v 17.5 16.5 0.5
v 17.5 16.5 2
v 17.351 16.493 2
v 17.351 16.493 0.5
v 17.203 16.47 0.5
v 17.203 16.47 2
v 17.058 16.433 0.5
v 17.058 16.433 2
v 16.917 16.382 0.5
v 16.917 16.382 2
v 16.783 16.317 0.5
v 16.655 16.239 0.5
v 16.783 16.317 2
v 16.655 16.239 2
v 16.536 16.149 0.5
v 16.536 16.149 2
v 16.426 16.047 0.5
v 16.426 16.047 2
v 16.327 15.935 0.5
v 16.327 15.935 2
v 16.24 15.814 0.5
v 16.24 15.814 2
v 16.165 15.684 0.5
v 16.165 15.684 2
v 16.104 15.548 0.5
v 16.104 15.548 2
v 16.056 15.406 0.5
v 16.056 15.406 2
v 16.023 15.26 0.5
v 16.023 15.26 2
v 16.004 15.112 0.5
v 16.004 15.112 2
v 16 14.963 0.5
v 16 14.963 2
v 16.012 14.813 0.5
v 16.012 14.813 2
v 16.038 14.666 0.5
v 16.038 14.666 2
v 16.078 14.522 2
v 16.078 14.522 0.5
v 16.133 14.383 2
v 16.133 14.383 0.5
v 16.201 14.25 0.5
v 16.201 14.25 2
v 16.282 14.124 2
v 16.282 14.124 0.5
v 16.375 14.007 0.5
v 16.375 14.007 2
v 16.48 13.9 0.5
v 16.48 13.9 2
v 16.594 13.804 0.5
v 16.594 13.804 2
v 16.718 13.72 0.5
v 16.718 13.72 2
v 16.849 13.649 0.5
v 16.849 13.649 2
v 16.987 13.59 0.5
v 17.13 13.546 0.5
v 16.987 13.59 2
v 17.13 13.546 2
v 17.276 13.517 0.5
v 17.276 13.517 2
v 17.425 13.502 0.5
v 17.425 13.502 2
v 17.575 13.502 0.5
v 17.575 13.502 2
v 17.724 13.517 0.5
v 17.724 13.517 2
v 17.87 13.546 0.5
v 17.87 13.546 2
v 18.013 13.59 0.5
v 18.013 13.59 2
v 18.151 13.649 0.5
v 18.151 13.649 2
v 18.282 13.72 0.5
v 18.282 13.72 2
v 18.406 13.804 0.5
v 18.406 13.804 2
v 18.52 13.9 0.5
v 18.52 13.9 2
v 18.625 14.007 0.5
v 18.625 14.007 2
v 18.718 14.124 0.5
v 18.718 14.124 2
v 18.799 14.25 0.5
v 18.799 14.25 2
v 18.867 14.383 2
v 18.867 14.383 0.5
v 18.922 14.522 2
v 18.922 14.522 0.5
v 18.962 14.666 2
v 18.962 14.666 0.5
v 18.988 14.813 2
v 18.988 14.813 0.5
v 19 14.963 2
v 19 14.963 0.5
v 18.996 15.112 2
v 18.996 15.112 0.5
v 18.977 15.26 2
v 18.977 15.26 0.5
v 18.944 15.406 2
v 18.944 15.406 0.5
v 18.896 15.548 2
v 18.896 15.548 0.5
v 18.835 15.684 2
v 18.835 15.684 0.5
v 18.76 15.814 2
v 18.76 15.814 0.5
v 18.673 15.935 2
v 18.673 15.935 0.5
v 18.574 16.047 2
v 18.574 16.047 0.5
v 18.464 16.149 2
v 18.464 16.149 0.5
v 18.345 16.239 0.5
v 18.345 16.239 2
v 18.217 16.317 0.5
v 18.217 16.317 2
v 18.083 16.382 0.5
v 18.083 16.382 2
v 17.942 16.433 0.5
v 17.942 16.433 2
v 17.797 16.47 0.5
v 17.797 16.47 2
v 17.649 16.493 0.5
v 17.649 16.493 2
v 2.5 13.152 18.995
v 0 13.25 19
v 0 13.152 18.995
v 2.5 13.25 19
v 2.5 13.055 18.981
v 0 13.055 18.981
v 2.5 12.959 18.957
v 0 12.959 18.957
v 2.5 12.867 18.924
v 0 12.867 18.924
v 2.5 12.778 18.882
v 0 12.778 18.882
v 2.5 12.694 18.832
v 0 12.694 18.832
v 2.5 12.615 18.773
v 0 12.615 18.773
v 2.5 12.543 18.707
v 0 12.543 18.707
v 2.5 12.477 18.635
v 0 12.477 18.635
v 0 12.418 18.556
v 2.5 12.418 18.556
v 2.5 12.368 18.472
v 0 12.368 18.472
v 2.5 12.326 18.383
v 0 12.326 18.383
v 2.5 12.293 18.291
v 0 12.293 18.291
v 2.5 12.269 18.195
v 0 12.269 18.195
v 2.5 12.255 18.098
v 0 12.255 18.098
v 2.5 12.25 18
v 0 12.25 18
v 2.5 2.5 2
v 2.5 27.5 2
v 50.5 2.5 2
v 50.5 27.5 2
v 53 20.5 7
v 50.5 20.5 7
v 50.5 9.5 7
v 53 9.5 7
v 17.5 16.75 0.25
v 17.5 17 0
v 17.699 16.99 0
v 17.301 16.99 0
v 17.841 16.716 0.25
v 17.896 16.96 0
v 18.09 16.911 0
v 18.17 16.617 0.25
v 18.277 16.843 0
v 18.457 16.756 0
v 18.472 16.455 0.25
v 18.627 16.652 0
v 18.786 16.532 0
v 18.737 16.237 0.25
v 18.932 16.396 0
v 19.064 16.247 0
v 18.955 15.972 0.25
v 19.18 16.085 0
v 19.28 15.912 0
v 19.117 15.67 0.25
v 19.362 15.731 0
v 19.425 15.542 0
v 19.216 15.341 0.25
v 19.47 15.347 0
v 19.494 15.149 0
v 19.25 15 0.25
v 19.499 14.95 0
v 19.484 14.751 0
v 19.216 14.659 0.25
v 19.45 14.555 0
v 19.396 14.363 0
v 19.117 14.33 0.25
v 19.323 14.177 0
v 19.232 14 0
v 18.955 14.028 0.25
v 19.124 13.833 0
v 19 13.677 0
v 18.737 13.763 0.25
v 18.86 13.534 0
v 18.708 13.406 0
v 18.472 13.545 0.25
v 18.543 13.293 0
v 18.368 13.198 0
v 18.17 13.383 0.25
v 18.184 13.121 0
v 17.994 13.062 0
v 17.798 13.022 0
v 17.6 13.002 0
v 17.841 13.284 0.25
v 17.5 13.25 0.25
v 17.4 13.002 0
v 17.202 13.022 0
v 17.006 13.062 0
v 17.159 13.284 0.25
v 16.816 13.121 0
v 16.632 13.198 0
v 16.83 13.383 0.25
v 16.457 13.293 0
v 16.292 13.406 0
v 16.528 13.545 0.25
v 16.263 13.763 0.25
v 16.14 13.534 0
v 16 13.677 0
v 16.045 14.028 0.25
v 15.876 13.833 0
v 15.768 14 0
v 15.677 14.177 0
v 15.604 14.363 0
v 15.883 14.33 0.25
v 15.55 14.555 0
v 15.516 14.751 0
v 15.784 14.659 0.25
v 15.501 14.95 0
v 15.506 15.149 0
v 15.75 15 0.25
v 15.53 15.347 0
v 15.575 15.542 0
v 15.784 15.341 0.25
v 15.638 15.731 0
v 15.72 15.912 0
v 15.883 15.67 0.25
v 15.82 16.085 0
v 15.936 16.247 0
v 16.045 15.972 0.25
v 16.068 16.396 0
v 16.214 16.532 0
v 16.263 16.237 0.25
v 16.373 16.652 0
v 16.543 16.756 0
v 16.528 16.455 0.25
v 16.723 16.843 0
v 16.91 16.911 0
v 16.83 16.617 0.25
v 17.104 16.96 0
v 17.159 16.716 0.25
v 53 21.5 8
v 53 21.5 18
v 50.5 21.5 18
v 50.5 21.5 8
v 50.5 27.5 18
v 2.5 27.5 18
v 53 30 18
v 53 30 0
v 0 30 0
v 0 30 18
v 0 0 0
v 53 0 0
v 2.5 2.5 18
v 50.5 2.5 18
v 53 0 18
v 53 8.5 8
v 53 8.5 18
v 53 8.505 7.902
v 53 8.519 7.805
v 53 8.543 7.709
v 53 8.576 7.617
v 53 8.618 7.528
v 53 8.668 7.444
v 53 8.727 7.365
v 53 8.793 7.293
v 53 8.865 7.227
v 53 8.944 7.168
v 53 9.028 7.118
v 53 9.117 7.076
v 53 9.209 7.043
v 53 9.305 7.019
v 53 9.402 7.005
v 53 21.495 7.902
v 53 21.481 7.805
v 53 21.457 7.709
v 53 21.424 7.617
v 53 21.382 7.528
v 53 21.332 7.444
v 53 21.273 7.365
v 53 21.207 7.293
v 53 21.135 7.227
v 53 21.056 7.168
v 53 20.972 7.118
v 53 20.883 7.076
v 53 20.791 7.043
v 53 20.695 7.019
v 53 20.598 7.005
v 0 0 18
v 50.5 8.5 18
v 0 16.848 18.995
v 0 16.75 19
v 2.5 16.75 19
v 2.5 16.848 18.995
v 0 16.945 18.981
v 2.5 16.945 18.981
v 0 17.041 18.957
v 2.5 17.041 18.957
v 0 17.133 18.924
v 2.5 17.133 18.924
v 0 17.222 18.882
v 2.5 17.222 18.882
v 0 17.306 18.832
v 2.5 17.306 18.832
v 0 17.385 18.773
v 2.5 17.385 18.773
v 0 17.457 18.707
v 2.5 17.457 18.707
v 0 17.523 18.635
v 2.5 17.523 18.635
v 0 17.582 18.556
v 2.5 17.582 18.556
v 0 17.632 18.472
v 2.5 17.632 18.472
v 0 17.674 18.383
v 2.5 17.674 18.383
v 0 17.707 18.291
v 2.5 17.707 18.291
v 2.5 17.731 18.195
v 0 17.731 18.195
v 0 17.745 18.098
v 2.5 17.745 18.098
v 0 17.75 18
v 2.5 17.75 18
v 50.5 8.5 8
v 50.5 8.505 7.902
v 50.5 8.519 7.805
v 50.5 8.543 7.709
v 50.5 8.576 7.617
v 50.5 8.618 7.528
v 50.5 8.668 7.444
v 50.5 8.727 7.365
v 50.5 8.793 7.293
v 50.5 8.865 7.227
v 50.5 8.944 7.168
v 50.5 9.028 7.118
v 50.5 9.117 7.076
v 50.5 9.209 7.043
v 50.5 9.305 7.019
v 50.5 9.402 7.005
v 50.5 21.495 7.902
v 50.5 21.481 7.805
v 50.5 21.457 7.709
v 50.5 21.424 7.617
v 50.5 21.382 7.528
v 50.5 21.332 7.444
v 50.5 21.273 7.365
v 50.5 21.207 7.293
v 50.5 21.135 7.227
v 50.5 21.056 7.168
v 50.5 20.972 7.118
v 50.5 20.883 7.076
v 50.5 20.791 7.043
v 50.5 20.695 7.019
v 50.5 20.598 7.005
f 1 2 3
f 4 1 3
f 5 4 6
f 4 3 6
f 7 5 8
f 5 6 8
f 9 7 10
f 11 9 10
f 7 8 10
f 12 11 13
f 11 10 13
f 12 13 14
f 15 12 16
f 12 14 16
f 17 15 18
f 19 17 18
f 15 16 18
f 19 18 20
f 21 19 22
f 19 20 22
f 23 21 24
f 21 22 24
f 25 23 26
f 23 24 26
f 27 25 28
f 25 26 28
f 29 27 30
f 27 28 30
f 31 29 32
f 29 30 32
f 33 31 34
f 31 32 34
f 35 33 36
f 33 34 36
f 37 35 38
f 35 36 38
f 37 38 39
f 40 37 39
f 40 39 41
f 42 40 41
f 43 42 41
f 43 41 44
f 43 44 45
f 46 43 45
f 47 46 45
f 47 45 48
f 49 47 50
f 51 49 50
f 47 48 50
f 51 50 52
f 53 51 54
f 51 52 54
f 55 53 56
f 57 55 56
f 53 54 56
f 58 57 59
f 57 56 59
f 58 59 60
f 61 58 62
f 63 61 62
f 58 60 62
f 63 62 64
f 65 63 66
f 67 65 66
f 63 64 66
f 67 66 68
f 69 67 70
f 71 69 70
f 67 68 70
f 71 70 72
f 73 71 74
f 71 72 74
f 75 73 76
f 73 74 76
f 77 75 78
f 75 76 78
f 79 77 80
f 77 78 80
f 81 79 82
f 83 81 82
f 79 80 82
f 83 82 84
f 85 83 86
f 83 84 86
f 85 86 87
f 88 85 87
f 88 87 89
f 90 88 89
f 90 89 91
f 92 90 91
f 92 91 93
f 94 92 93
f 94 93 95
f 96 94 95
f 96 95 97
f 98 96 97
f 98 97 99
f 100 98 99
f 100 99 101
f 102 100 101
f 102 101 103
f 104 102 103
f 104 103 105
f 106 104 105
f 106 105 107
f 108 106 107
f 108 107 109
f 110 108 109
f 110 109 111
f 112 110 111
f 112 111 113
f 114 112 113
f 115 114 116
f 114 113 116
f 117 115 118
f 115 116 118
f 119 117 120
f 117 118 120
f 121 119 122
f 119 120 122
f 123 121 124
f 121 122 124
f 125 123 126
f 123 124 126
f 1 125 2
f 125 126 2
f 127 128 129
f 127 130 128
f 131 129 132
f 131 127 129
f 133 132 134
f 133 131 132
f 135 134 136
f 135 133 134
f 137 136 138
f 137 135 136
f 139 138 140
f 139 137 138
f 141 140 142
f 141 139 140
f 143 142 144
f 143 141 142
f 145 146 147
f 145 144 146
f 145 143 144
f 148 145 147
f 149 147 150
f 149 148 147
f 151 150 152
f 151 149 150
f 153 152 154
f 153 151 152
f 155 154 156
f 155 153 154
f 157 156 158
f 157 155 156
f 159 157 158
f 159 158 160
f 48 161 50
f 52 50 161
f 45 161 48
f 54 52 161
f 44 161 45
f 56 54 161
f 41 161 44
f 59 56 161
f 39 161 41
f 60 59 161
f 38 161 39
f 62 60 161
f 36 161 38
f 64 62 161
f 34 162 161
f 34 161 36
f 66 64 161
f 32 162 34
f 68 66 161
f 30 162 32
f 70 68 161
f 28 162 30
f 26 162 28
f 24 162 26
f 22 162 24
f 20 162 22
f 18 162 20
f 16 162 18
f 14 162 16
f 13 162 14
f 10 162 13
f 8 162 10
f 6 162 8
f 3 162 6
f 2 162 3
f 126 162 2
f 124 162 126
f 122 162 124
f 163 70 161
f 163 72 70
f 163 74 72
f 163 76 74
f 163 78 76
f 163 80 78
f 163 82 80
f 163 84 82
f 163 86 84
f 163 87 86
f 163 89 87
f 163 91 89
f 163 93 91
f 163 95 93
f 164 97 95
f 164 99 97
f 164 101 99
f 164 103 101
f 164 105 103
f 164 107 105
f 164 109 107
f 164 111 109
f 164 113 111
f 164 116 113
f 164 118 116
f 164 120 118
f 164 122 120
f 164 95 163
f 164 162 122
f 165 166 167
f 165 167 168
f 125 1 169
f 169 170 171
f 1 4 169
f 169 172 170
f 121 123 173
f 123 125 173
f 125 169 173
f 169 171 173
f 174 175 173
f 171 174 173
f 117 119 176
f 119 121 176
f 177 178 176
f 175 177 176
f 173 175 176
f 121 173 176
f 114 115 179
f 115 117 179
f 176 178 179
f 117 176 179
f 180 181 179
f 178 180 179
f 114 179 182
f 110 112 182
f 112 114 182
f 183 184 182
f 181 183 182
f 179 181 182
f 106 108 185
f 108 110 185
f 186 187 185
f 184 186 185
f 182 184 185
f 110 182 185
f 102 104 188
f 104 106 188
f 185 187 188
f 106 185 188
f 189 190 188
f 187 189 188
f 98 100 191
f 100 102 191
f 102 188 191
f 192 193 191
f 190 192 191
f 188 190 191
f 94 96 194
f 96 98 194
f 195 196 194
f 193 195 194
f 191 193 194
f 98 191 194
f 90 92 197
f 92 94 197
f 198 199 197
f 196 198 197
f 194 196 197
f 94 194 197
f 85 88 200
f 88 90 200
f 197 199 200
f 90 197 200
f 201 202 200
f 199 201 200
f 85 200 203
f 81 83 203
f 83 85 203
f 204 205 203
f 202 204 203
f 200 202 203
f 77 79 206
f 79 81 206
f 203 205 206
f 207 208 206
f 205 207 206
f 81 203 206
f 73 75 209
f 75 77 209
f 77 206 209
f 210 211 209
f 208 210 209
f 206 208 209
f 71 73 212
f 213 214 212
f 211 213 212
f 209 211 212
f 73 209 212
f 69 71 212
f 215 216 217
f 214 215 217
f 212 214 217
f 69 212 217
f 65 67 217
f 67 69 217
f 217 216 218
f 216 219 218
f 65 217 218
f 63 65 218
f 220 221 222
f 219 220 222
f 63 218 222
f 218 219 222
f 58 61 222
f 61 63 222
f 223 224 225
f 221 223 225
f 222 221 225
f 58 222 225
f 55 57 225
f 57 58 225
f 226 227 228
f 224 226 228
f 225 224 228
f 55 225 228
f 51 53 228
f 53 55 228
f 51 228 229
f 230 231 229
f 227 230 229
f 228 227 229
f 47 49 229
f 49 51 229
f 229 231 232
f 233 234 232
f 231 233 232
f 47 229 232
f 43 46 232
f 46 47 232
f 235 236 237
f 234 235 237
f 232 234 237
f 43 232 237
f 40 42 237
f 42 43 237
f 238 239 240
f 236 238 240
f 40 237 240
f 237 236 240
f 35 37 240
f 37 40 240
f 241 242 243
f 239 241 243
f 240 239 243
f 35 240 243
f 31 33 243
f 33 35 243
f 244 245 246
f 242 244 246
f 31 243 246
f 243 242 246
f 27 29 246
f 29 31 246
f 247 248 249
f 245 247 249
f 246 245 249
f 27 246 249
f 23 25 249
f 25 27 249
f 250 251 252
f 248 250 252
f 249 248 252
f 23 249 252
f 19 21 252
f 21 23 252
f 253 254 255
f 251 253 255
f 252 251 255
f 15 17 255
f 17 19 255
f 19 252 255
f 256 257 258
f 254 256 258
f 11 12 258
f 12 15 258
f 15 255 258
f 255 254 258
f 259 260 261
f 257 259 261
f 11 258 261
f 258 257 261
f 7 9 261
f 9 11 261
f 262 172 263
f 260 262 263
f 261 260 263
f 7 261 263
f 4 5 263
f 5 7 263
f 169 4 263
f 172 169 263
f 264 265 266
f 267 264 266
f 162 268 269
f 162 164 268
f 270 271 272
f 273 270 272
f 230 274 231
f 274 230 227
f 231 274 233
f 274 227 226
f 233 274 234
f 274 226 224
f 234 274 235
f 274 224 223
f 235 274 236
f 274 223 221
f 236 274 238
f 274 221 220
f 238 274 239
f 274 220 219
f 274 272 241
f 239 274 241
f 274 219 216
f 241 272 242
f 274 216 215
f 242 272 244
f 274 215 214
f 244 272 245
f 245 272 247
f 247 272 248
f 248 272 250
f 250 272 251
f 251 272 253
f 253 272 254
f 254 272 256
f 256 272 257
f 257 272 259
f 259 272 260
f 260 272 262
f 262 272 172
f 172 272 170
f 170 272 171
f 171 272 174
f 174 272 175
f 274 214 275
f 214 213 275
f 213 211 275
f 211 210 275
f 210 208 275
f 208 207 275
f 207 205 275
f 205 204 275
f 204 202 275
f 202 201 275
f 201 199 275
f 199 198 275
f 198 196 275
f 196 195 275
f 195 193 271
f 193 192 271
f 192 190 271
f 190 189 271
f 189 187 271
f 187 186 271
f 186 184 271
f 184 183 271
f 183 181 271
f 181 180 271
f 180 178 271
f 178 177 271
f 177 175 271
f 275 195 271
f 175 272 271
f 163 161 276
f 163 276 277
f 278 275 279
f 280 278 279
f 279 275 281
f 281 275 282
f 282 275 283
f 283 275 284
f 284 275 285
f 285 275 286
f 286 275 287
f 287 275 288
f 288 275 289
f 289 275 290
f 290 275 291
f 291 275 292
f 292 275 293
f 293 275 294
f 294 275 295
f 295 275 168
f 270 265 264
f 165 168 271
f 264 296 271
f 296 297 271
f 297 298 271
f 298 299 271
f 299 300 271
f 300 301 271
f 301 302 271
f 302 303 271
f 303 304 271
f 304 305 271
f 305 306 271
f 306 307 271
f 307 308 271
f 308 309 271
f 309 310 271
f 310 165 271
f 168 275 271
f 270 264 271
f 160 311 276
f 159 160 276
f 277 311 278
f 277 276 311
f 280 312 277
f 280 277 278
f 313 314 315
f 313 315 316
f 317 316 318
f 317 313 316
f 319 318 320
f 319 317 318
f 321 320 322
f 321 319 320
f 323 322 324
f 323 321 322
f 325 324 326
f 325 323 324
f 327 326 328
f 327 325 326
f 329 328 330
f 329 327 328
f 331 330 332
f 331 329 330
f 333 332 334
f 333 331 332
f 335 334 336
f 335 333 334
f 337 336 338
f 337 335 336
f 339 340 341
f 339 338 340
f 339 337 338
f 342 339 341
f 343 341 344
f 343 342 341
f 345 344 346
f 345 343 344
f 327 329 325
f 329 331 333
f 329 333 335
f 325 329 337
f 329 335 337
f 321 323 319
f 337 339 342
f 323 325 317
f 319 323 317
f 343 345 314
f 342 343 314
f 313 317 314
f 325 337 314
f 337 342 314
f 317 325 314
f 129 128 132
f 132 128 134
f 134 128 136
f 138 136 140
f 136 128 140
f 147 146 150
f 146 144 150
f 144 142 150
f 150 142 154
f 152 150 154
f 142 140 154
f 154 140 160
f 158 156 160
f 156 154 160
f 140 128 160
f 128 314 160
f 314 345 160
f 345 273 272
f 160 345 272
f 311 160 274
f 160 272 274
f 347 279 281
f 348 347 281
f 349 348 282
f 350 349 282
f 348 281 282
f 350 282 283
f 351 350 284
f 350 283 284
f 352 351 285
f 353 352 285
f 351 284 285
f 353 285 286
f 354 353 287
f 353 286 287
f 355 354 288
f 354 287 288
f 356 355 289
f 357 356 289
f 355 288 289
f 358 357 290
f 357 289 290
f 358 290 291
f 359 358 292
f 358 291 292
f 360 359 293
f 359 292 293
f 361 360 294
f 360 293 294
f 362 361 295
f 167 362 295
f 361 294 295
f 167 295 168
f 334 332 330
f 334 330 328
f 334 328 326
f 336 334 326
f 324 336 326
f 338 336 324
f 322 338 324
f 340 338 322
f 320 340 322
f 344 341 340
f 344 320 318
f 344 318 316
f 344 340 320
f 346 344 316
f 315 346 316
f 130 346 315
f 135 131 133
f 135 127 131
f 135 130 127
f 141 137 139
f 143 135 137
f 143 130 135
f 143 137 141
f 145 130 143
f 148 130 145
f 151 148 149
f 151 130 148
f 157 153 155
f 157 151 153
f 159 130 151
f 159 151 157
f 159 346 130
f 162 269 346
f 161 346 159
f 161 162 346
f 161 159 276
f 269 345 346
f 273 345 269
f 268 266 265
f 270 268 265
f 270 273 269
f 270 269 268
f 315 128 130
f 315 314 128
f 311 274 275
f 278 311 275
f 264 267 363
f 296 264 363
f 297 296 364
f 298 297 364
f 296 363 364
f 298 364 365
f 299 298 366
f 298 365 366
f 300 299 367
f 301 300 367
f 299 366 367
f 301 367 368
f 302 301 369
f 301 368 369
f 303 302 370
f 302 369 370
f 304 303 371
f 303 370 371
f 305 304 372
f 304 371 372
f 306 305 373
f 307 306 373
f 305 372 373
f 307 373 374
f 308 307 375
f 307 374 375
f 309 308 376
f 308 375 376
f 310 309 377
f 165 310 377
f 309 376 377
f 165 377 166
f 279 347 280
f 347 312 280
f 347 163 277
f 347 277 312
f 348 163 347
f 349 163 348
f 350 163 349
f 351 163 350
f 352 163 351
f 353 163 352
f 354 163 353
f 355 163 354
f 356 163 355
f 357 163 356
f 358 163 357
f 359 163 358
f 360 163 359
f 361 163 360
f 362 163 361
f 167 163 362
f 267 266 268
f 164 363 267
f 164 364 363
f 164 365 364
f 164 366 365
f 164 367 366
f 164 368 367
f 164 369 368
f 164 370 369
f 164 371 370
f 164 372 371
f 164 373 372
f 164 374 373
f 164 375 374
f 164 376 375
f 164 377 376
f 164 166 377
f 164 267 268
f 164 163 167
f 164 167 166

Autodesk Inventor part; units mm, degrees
ref_plane "YZ Plane" through (0, 0, 0) normal (1, 0, 0) x (0, 1, 0)
ref_plane "XZ Plane" through (0, 0, 0) normal (0, 1, 0) x (-1, 0, 0)
ref_plane "XY Plane" through (0, 0, 0) normal (0, 0, 1) x (1, 0, 0)
sketch "Skizze1" plane through (0, 0, 0) normal (0, 0, 1) x (1, 0, 0)
  line L0 (0, 0) -> (53, 0)
  line L1 (53, 0) -> (53, 30)
  line L2 (53, 30) -> (0, 30)
  line L3 (0, 30) -> (0, 0)
  dimension "d0" = 30
  dimension "d1" = 53
extrude "Extrusion1" add sketch "Skizze1" along normal blind 2
sketch "Skizze2" plane through (0, 0, 2) normal (0, 0, 1) x (1, 0, 0)
  line L0 (0, 0) -> (53, 0)
  line L1 (53, 0) -> (53, 30)
  line L2 (53, 30) -> (0, 30)
  line L3 (0, 30) -> (0, 0)
  line L4 (2.5, 2.5) -> (50.5, 2.5)
  line L5 (50.5, 2.5) -> (50.5, 27.5)
  line L6 (50.5, 27.5) -> (2.5, 27.5)
  line L7 (2.5, 27.5) -> (2.5, 2.5)
  dimension "d4" = 25
  dimension "d5" = 48
  dimension "d6" = 2.5
  dimension "d7" = 2.5
  dimension "d8" = 2.5
  dimension "d9" = 2.5
extrude "Extrusion2" add sketch "Skizze2" along normal blind 16
sketch "Skizze8" plane through (0, 0, 18) normal (0, 0, 1) x (1, 0, 0)
  line L0 (50.5, 27.5) -> (50.5, 2.5) projected
  line L1 (53, 0) -> (53, 30) projected
  line L2 (50.5, 8.5) -> (53, 8.5)
  line L3 (53, 8.5) -> (53, 21.5)
  line L4 (53, 21.5) -> (50.5, 21.5)
  line L5 (50.5, 21.5) -> (50.5, 8.5)
  line L6 (0, 0) -> (53, 0) projected
  line L7 (53, 30) -> (0, 30) projected
  dimension "d49" = 13
  dimension "d50" = 8.5
  dimension "d51" = 8.5
extrude "Extrusion8" cut sketch "Skizze8" against normal blind 11
hole "Bohrung2" at (17.5, 15, 0) direction (0, 0, 1) diameter 3 end through all countersink diameter 4 countersink angle 90
sketch "Skizze9" plane through (0, 0, 18) normal (0, 0, 1) x (1, 0, 0)
  line L0 (2.5, 27.5) -> (2.5, 2.5) projected
  line L1 (0, 12.25) -> (2.5, 12.25)
  line L2 (2.5, 12.25) -> (2.5, 17.75)
  line L3 (2.5, 17.75) -> (0, 17.75)
  line L4 (0, 17.75) -> (0, 12.25)
  line L5 (0, 0) -> (53, 0) projected
  line L6 (53, 30) -> (0, 30) projected
  dimension "d63" = 5.5
  dimension "d64" = 12.25
  dimension "d65" = 12.25
extrude "Extrusion9" add sketch "Skizze9" along normal blind 1
fillet "Rundung2" radius 1 4 edges at (1.25, 12.25, 19) (1.25, 17.75, 19) (51.75, 21.5, 7) (51.75, 8.5, 7)
properties part number "V2_oberteil"
